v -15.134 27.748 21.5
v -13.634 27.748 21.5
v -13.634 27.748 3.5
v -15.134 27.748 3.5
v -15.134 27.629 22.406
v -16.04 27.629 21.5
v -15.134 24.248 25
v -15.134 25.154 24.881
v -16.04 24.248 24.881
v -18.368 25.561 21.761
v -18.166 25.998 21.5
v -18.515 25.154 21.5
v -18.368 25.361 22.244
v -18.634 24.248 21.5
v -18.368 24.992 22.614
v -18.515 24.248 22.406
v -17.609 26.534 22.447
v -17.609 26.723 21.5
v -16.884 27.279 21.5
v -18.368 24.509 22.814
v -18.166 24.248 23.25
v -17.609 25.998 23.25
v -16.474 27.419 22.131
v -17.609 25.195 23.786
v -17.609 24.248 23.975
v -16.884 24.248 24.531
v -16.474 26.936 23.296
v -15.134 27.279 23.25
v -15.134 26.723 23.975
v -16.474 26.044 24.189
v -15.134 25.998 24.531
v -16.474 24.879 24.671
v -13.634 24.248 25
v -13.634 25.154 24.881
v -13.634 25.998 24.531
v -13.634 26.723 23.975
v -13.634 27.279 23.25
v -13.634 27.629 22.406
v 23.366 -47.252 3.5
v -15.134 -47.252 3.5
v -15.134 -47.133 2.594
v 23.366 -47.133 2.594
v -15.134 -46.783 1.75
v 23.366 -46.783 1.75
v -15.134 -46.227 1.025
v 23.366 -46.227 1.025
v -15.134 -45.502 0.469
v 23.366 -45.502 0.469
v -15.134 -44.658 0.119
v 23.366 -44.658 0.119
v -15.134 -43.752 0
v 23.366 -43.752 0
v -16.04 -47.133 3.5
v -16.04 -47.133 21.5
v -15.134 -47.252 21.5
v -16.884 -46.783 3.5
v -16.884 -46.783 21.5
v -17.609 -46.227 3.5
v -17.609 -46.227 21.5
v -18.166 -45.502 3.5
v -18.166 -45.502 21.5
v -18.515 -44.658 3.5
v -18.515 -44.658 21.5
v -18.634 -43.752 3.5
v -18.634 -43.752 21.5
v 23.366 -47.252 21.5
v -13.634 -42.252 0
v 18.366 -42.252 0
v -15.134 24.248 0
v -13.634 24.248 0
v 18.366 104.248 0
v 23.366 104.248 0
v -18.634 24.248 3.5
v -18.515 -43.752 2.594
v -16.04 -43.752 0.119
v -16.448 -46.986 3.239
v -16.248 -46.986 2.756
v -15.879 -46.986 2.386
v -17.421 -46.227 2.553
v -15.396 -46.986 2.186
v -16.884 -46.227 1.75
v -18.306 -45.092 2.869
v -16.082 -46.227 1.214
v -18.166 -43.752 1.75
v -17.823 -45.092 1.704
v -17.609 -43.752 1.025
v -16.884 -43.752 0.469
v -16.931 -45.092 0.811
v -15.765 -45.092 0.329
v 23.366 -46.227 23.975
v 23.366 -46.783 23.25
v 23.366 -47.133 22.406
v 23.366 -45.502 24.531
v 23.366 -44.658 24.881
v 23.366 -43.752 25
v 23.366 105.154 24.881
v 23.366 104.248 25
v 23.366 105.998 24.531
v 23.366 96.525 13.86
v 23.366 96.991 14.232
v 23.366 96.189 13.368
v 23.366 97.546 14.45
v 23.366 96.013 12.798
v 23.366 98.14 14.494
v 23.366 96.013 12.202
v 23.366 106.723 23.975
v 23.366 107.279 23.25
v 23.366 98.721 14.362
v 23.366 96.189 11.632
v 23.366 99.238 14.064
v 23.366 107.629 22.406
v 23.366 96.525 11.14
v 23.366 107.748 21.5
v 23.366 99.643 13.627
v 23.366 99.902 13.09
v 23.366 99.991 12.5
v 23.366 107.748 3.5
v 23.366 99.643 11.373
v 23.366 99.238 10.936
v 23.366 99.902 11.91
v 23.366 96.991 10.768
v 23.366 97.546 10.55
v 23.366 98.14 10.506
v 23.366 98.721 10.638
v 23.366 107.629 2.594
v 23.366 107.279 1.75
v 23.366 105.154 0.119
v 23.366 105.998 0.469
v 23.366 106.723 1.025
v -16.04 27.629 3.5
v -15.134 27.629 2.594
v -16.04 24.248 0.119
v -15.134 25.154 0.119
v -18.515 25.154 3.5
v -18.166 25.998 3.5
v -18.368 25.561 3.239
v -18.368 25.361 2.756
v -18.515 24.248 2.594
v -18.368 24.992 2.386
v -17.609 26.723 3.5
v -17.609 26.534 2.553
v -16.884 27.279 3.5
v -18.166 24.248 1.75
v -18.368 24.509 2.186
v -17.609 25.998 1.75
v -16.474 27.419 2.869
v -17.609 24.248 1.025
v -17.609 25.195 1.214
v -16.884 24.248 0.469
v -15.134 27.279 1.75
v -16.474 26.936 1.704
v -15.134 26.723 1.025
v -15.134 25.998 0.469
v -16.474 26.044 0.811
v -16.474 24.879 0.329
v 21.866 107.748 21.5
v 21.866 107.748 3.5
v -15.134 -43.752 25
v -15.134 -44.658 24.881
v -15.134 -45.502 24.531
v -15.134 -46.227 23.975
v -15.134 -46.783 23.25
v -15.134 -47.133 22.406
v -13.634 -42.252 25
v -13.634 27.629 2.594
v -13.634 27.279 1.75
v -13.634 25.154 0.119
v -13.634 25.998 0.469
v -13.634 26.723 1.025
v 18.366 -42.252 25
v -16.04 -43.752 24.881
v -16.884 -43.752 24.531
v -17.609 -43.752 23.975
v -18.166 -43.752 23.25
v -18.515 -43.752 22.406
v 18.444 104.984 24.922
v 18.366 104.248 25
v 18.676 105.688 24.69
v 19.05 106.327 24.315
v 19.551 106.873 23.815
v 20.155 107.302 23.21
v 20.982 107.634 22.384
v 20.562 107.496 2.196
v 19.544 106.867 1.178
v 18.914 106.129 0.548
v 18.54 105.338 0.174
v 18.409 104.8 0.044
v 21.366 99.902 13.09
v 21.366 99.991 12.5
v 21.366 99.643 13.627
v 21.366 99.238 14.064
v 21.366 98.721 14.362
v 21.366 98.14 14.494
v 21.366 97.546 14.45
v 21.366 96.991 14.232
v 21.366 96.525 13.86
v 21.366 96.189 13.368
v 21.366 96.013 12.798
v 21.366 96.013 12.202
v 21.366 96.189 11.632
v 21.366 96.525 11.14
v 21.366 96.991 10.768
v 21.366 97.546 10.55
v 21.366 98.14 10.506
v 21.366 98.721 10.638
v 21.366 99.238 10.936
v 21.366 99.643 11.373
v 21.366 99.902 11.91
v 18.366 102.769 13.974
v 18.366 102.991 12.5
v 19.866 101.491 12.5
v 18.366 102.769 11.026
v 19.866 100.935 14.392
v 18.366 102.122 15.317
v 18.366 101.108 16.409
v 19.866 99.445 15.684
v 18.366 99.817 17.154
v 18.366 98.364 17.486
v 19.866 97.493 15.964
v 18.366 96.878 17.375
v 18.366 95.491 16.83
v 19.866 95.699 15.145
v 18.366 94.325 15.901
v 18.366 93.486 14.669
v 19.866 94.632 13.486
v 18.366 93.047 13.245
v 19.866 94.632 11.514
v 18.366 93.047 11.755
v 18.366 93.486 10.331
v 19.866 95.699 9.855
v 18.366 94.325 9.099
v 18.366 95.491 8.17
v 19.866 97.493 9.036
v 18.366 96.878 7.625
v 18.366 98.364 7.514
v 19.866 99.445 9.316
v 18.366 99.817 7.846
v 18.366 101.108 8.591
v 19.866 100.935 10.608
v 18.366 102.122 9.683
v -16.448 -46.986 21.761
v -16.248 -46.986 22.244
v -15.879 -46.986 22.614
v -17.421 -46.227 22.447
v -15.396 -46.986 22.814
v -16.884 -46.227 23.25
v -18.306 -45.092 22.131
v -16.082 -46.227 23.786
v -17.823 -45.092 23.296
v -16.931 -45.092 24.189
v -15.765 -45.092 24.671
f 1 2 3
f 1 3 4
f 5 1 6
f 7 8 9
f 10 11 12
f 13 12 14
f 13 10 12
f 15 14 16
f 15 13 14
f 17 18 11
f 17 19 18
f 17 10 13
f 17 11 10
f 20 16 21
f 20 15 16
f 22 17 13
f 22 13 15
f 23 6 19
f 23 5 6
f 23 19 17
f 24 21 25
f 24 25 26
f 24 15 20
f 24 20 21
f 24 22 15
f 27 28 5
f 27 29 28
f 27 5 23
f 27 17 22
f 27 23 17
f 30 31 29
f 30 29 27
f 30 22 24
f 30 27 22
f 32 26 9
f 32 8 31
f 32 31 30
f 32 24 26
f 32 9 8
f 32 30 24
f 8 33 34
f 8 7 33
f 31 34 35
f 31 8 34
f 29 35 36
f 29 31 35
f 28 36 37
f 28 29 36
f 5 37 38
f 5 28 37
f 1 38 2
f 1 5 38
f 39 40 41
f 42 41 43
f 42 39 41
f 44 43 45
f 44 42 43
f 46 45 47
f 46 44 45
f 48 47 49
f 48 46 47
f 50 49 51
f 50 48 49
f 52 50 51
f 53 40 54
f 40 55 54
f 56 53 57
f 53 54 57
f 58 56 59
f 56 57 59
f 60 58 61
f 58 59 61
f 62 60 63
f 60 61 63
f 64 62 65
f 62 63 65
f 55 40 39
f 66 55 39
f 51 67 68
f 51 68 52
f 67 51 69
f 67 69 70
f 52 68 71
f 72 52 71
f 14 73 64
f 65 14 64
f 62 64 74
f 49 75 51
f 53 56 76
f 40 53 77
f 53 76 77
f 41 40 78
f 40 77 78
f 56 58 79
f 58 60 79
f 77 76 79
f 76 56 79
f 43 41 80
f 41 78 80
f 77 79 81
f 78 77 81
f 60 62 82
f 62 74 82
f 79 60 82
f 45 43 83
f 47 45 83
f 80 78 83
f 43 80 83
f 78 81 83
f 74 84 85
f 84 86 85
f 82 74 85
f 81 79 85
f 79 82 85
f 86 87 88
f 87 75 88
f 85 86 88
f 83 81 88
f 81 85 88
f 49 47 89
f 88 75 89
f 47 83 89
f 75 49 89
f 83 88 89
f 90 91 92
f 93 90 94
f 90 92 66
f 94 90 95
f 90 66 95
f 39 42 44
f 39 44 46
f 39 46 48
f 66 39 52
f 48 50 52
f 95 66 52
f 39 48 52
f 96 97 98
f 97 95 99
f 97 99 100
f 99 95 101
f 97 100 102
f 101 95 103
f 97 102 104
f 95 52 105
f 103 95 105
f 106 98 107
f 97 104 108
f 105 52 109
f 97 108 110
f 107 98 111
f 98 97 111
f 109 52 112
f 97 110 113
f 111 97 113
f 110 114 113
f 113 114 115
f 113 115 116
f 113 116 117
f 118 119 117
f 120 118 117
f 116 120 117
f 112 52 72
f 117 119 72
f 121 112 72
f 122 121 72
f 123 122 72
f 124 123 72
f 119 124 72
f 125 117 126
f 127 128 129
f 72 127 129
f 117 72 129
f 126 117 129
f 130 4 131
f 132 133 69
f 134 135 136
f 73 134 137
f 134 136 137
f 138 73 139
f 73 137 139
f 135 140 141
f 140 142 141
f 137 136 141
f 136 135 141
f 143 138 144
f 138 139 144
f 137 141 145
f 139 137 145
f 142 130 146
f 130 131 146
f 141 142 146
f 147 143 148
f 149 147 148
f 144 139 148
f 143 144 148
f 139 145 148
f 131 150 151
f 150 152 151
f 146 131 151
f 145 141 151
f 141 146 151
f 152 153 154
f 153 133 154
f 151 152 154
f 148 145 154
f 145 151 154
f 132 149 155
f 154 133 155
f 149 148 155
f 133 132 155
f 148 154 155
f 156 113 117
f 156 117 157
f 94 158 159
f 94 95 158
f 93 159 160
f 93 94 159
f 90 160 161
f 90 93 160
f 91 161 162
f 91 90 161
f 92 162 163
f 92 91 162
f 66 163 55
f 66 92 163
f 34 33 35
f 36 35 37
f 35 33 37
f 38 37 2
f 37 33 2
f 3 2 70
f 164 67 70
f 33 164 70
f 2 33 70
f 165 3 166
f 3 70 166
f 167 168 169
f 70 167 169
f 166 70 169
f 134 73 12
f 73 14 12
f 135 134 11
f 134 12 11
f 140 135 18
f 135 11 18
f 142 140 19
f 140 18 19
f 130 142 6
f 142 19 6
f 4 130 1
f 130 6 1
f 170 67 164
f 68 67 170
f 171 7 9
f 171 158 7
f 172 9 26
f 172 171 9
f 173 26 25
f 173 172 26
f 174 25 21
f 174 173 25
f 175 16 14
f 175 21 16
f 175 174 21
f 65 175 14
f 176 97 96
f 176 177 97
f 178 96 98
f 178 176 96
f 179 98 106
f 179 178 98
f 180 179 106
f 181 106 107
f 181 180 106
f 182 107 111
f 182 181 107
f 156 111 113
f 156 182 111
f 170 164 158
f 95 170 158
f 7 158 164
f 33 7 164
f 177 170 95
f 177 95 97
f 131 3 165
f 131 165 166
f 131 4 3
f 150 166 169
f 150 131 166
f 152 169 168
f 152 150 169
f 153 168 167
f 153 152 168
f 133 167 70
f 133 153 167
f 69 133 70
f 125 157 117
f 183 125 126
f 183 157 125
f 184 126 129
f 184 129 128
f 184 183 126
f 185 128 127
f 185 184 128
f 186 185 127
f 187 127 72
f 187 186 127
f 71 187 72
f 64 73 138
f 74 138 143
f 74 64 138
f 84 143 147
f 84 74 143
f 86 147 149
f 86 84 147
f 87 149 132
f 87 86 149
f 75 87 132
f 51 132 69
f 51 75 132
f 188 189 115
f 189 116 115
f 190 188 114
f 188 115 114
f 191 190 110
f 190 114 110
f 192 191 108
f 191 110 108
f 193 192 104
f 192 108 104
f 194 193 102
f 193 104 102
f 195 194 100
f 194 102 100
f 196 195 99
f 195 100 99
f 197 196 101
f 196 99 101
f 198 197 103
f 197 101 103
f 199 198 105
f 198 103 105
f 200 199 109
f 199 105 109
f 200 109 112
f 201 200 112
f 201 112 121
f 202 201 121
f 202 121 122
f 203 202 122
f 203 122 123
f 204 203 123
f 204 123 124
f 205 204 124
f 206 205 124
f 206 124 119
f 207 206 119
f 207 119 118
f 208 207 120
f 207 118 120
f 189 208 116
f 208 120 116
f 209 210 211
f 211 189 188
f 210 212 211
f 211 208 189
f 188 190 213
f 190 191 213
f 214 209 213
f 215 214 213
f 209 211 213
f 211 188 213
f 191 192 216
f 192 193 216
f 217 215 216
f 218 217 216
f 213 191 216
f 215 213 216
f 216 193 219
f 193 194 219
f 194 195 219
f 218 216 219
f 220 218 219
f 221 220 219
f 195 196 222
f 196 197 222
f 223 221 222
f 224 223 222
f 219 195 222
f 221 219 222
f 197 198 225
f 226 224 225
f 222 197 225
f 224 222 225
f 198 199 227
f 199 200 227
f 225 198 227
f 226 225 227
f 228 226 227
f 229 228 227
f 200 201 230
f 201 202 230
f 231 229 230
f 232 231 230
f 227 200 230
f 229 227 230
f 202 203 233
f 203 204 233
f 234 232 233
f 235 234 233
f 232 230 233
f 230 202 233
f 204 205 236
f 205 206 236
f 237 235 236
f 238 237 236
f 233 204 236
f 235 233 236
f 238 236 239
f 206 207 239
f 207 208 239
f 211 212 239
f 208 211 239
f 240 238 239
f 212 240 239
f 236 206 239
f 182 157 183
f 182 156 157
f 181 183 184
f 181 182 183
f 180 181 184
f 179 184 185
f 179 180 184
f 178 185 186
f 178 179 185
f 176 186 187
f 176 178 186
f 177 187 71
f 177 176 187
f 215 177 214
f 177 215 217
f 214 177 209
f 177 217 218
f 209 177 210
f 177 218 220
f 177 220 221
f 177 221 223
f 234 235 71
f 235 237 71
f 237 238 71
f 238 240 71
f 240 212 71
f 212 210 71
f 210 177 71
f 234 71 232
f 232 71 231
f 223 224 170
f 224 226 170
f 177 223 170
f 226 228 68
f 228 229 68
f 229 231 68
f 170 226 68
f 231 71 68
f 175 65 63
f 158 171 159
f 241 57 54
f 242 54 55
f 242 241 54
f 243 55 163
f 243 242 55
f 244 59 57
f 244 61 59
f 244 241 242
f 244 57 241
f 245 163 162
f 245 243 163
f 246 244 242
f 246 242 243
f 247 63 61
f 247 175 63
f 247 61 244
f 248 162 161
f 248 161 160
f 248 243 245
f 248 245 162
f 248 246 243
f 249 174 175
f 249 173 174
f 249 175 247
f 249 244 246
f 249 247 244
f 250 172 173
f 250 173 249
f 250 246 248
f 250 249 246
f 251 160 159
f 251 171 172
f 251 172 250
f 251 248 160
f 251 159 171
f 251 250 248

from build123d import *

# Parameters (mm, degrees)
F0_W           = 32
F0_H           = 5
F1_DEPTH       = 25
F3_D           = 4
F3_CSINK_D     = 10
F3_CSINK_ANGLE = 90
F4_R           = 3.5


with BuildPart() as f1:
    # F0 (on Top) → F1 (new body)
    with BuildSketch(Plane.XY):
        with Locations((2.365528, -44.752212)):
            Rectangle(F0_W, F0_H)
        Polygon((-18.634472, -47.252212), (-13.634472, -47.252212), (-13.634472, -42.252212), (-13.634472, 27.747788), (-18.634472, 27.747788), align=None)
        Polygon((18.365528, -42.252212), (18.365528, -47.252212), (23.365528, -47.252212), (23.365528, 107.747788), (18.365528, 107.747788), align=None)
    extrude(amount=F1_DEPTH)

    # F3 (through all)
    with Locations(Plane(origin=(18.365528, 0, 0), x_dir=(0, -1, 0), z_dir=(-1, 0, 0))):
        with Locations((-97.990669, 12.5)):
            CounterSinkHole(F3_D / 2, F3_CSINK_D / 2, counter_sink_angle=F3_CSINK_ANGLE)

    # F4
    f4_edges = [f1.edges().sort_by_distance(p)[0] for p in [
        (-16.134472, 27.747788, 0),
        (-16.134472, 27.747788, 25),
        (20.865528, 107.747788, 0),
        (20.865528, 107.747788, 25),
        (-18.634472, 27.747788, 12.5),
        (-18.634472, -9.752212, 25),
        (-18.634472, -9.752212, 0),
        (-18.634472, -47.252212, 12.5),
        (2.365528, -47.252212, 25),
        (2.365528, -47.252212, 0),
        (18.365528, 107.747788, 12.5),
    ]]
    fillet(f4_edges, radius=F4_R)


solid = f1.part
